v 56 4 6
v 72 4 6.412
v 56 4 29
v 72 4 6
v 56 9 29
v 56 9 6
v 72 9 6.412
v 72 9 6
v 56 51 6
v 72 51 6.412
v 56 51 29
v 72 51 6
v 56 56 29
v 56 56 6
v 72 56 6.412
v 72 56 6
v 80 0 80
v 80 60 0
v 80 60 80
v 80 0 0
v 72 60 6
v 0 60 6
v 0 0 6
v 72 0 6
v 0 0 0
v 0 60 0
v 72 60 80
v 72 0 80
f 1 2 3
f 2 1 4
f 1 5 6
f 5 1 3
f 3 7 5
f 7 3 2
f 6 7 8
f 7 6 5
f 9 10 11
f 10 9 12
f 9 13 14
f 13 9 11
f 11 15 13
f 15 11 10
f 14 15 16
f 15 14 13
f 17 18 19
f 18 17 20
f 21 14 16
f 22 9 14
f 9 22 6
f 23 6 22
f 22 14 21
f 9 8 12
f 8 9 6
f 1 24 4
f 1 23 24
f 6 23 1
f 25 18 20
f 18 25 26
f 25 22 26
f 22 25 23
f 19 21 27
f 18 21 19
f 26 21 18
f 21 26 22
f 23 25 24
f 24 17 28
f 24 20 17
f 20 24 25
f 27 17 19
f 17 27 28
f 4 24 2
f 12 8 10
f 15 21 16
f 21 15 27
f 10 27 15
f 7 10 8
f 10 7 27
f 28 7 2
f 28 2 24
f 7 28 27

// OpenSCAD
$fn = 32;

// ----------------------------------------------------------------------
// Rib bracket: 2-gusset L bracket
// ----------------------------------------------------------------------

// --- parameters (mm) ---
base_l = 80;              // foot length, X
base_w = 60;              // foot width, Y
base_t = 6;               // foot thickness
plate_t = 8;              // upright plate thickness
plate_h = 80;             // overall height
gus_l = 16;               // gusset leg along the foot
gus_h = 24;               // gusset height
gus_t = 5;                // gusset thickness
gus_edge = 4;             // gusset margin from the foot edge
n_gus = 2;                // gusset count

gus_pitch = (base_w - 2 * gus_edge - gus_t) / (n_gus - 1);  // gusset pitch

union() {
  cube([base_l, base_w, base_t]);
  translate([base_l - plate_t, 0, base_t - 1])
    cube([plate_t, base_w, plate_h - base_t + 1]);
  for (i = [0 : n_gus - 1])
    translate([base_l - plate_t - gus_l, gus_edge + i * gus_pitch, base_t - 1])
      rotate([-90, 0, 0])
        linear_extrude(height = gus_t)
          polygon(points = [[0, 0], [gus_l + 1, 0], [0, -gus_h]]);
}
